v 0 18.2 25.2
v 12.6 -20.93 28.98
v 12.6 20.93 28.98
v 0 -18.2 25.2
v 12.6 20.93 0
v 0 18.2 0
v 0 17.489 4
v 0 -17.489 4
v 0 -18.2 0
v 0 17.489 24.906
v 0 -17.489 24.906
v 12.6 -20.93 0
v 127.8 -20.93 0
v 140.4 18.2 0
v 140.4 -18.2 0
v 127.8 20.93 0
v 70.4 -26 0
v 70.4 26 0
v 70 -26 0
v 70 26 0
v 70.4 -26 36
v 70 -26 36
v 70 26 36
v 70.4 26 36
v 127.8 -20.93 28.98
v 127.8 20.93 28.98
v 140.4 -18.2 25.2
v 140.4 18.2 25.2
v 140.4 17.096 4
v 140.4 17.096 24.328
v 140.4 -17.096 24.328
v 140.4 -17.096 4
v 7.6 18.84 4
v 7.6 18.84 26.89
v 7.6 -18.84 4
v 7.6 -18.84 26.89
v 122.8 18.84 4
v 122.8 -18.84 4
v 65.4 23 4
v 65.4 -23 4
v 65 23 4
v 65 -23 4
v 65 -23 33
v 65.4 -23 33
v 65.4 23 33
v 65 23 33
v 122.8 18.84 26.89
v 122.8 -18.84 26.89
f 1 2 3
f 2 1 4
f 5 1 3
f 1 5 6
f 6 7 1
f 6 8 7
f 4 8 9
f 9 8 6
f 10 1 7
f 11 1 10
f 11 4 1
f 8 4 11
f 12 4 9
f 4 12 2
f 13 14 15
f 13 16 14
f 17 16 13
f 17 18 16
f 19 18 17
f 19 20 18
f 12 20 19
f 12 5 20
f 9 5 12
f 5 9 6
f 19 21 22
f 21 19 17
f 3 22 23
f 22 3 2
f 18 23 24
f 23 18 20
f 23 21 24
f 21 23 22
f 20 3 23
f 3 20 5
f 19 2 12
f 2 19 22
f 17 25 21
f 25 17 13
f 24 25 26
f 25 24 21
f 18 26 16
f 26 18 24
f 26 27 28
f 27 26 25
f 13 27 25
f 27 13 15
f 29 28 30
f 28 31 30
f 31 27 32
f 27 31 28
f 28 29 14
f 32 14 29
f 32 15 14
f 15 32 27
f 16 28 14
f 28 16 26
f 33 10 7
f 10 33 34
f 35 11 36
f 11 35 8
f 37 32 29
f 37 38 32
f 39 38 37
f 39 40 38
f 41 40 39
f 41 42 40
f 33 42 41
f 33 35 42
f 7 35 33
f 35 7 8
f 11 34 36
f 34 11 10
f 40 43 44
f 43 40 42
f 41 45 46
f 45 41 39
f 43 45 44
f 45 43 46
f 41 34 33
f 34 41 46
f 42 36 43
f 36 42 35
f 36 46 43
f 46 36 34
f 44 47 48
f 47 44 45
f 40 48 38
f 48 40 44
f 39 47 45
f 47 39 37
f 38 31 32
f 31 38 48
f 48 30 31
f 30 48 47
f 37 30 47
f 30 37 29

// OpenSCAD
$fn = 32;

// ----------------------------------------------------------------------
// Faired channel: 140 x 52 x 36 mm, 3 mm walls, faired ends
// ----------------------------------------------------------------------

// --- parameters (mm) ---
length = 140;             // channel length
width = 52;               // channel width at mid length
height = 36;              // channel height at mid length
wall = 3;                 // side wall thickness
floor_t = 4;              // floor thickness
end_w = 36.4;             // faired end width
end_h = 25.2;             // faired end height

difference() {
  union() {
    hull() {
      translate([0, -18.2, 0]) cube([0.4, 36.4, 25.2]);
      translate([12.6, -20.93, 0]) cube([0.4, 41.86, 28.98]);
    }
    hull() {
      translate([12.6, -20.93, 0]) cube([0.4, 41.86, 28.98]);
      translate([70, -26, 0]) cube([0.4, 52, 36]);
    }
    hull() {
      translate([70, -26, 0]) cube([0.4, 52, 36]);
      translate([127.4, -20.93, 0]) cube([0.4, 41.86, 28.98]);
    }
    hull() {
      translate([127.4, -20.93, 0]) cube([0.4, 41.86, 28.98]);
      translate([140, -18.2, 0]) cube([0.4, 36.4, 25.2]);
    }
  }
  /* cavity, 5 mm proud of both ends so the ports are cut clean */
  hull() {
    translate([-5, -16.6, 4]) cube([0.4, 33.2, 19.6]);
    translate([7.6, -18.84, 4]) cube([0.4, 37.68, 22.89]);
  }
  hull() {
    translate([7.6, -18.84, 4]) cube([0.4, 37.68, 22.89]);
    translate([65, -23, 4]) cube([0.4, 46, 29]);
  }
  hull() {
    translate([65, -23, 4]) cube([0.4, 46, 29]);
    translate([122.4, -18.84, 4]) cube([0.4, 37.68, 22.89]);
  }
  hull() {
    translate([122.4, -18.84, 4]) cube([0.4, 37.68, 22.89]);
    translate([145, -16.6, 4]) cube([0.4, 33.2, 19.6]);
  }
}
